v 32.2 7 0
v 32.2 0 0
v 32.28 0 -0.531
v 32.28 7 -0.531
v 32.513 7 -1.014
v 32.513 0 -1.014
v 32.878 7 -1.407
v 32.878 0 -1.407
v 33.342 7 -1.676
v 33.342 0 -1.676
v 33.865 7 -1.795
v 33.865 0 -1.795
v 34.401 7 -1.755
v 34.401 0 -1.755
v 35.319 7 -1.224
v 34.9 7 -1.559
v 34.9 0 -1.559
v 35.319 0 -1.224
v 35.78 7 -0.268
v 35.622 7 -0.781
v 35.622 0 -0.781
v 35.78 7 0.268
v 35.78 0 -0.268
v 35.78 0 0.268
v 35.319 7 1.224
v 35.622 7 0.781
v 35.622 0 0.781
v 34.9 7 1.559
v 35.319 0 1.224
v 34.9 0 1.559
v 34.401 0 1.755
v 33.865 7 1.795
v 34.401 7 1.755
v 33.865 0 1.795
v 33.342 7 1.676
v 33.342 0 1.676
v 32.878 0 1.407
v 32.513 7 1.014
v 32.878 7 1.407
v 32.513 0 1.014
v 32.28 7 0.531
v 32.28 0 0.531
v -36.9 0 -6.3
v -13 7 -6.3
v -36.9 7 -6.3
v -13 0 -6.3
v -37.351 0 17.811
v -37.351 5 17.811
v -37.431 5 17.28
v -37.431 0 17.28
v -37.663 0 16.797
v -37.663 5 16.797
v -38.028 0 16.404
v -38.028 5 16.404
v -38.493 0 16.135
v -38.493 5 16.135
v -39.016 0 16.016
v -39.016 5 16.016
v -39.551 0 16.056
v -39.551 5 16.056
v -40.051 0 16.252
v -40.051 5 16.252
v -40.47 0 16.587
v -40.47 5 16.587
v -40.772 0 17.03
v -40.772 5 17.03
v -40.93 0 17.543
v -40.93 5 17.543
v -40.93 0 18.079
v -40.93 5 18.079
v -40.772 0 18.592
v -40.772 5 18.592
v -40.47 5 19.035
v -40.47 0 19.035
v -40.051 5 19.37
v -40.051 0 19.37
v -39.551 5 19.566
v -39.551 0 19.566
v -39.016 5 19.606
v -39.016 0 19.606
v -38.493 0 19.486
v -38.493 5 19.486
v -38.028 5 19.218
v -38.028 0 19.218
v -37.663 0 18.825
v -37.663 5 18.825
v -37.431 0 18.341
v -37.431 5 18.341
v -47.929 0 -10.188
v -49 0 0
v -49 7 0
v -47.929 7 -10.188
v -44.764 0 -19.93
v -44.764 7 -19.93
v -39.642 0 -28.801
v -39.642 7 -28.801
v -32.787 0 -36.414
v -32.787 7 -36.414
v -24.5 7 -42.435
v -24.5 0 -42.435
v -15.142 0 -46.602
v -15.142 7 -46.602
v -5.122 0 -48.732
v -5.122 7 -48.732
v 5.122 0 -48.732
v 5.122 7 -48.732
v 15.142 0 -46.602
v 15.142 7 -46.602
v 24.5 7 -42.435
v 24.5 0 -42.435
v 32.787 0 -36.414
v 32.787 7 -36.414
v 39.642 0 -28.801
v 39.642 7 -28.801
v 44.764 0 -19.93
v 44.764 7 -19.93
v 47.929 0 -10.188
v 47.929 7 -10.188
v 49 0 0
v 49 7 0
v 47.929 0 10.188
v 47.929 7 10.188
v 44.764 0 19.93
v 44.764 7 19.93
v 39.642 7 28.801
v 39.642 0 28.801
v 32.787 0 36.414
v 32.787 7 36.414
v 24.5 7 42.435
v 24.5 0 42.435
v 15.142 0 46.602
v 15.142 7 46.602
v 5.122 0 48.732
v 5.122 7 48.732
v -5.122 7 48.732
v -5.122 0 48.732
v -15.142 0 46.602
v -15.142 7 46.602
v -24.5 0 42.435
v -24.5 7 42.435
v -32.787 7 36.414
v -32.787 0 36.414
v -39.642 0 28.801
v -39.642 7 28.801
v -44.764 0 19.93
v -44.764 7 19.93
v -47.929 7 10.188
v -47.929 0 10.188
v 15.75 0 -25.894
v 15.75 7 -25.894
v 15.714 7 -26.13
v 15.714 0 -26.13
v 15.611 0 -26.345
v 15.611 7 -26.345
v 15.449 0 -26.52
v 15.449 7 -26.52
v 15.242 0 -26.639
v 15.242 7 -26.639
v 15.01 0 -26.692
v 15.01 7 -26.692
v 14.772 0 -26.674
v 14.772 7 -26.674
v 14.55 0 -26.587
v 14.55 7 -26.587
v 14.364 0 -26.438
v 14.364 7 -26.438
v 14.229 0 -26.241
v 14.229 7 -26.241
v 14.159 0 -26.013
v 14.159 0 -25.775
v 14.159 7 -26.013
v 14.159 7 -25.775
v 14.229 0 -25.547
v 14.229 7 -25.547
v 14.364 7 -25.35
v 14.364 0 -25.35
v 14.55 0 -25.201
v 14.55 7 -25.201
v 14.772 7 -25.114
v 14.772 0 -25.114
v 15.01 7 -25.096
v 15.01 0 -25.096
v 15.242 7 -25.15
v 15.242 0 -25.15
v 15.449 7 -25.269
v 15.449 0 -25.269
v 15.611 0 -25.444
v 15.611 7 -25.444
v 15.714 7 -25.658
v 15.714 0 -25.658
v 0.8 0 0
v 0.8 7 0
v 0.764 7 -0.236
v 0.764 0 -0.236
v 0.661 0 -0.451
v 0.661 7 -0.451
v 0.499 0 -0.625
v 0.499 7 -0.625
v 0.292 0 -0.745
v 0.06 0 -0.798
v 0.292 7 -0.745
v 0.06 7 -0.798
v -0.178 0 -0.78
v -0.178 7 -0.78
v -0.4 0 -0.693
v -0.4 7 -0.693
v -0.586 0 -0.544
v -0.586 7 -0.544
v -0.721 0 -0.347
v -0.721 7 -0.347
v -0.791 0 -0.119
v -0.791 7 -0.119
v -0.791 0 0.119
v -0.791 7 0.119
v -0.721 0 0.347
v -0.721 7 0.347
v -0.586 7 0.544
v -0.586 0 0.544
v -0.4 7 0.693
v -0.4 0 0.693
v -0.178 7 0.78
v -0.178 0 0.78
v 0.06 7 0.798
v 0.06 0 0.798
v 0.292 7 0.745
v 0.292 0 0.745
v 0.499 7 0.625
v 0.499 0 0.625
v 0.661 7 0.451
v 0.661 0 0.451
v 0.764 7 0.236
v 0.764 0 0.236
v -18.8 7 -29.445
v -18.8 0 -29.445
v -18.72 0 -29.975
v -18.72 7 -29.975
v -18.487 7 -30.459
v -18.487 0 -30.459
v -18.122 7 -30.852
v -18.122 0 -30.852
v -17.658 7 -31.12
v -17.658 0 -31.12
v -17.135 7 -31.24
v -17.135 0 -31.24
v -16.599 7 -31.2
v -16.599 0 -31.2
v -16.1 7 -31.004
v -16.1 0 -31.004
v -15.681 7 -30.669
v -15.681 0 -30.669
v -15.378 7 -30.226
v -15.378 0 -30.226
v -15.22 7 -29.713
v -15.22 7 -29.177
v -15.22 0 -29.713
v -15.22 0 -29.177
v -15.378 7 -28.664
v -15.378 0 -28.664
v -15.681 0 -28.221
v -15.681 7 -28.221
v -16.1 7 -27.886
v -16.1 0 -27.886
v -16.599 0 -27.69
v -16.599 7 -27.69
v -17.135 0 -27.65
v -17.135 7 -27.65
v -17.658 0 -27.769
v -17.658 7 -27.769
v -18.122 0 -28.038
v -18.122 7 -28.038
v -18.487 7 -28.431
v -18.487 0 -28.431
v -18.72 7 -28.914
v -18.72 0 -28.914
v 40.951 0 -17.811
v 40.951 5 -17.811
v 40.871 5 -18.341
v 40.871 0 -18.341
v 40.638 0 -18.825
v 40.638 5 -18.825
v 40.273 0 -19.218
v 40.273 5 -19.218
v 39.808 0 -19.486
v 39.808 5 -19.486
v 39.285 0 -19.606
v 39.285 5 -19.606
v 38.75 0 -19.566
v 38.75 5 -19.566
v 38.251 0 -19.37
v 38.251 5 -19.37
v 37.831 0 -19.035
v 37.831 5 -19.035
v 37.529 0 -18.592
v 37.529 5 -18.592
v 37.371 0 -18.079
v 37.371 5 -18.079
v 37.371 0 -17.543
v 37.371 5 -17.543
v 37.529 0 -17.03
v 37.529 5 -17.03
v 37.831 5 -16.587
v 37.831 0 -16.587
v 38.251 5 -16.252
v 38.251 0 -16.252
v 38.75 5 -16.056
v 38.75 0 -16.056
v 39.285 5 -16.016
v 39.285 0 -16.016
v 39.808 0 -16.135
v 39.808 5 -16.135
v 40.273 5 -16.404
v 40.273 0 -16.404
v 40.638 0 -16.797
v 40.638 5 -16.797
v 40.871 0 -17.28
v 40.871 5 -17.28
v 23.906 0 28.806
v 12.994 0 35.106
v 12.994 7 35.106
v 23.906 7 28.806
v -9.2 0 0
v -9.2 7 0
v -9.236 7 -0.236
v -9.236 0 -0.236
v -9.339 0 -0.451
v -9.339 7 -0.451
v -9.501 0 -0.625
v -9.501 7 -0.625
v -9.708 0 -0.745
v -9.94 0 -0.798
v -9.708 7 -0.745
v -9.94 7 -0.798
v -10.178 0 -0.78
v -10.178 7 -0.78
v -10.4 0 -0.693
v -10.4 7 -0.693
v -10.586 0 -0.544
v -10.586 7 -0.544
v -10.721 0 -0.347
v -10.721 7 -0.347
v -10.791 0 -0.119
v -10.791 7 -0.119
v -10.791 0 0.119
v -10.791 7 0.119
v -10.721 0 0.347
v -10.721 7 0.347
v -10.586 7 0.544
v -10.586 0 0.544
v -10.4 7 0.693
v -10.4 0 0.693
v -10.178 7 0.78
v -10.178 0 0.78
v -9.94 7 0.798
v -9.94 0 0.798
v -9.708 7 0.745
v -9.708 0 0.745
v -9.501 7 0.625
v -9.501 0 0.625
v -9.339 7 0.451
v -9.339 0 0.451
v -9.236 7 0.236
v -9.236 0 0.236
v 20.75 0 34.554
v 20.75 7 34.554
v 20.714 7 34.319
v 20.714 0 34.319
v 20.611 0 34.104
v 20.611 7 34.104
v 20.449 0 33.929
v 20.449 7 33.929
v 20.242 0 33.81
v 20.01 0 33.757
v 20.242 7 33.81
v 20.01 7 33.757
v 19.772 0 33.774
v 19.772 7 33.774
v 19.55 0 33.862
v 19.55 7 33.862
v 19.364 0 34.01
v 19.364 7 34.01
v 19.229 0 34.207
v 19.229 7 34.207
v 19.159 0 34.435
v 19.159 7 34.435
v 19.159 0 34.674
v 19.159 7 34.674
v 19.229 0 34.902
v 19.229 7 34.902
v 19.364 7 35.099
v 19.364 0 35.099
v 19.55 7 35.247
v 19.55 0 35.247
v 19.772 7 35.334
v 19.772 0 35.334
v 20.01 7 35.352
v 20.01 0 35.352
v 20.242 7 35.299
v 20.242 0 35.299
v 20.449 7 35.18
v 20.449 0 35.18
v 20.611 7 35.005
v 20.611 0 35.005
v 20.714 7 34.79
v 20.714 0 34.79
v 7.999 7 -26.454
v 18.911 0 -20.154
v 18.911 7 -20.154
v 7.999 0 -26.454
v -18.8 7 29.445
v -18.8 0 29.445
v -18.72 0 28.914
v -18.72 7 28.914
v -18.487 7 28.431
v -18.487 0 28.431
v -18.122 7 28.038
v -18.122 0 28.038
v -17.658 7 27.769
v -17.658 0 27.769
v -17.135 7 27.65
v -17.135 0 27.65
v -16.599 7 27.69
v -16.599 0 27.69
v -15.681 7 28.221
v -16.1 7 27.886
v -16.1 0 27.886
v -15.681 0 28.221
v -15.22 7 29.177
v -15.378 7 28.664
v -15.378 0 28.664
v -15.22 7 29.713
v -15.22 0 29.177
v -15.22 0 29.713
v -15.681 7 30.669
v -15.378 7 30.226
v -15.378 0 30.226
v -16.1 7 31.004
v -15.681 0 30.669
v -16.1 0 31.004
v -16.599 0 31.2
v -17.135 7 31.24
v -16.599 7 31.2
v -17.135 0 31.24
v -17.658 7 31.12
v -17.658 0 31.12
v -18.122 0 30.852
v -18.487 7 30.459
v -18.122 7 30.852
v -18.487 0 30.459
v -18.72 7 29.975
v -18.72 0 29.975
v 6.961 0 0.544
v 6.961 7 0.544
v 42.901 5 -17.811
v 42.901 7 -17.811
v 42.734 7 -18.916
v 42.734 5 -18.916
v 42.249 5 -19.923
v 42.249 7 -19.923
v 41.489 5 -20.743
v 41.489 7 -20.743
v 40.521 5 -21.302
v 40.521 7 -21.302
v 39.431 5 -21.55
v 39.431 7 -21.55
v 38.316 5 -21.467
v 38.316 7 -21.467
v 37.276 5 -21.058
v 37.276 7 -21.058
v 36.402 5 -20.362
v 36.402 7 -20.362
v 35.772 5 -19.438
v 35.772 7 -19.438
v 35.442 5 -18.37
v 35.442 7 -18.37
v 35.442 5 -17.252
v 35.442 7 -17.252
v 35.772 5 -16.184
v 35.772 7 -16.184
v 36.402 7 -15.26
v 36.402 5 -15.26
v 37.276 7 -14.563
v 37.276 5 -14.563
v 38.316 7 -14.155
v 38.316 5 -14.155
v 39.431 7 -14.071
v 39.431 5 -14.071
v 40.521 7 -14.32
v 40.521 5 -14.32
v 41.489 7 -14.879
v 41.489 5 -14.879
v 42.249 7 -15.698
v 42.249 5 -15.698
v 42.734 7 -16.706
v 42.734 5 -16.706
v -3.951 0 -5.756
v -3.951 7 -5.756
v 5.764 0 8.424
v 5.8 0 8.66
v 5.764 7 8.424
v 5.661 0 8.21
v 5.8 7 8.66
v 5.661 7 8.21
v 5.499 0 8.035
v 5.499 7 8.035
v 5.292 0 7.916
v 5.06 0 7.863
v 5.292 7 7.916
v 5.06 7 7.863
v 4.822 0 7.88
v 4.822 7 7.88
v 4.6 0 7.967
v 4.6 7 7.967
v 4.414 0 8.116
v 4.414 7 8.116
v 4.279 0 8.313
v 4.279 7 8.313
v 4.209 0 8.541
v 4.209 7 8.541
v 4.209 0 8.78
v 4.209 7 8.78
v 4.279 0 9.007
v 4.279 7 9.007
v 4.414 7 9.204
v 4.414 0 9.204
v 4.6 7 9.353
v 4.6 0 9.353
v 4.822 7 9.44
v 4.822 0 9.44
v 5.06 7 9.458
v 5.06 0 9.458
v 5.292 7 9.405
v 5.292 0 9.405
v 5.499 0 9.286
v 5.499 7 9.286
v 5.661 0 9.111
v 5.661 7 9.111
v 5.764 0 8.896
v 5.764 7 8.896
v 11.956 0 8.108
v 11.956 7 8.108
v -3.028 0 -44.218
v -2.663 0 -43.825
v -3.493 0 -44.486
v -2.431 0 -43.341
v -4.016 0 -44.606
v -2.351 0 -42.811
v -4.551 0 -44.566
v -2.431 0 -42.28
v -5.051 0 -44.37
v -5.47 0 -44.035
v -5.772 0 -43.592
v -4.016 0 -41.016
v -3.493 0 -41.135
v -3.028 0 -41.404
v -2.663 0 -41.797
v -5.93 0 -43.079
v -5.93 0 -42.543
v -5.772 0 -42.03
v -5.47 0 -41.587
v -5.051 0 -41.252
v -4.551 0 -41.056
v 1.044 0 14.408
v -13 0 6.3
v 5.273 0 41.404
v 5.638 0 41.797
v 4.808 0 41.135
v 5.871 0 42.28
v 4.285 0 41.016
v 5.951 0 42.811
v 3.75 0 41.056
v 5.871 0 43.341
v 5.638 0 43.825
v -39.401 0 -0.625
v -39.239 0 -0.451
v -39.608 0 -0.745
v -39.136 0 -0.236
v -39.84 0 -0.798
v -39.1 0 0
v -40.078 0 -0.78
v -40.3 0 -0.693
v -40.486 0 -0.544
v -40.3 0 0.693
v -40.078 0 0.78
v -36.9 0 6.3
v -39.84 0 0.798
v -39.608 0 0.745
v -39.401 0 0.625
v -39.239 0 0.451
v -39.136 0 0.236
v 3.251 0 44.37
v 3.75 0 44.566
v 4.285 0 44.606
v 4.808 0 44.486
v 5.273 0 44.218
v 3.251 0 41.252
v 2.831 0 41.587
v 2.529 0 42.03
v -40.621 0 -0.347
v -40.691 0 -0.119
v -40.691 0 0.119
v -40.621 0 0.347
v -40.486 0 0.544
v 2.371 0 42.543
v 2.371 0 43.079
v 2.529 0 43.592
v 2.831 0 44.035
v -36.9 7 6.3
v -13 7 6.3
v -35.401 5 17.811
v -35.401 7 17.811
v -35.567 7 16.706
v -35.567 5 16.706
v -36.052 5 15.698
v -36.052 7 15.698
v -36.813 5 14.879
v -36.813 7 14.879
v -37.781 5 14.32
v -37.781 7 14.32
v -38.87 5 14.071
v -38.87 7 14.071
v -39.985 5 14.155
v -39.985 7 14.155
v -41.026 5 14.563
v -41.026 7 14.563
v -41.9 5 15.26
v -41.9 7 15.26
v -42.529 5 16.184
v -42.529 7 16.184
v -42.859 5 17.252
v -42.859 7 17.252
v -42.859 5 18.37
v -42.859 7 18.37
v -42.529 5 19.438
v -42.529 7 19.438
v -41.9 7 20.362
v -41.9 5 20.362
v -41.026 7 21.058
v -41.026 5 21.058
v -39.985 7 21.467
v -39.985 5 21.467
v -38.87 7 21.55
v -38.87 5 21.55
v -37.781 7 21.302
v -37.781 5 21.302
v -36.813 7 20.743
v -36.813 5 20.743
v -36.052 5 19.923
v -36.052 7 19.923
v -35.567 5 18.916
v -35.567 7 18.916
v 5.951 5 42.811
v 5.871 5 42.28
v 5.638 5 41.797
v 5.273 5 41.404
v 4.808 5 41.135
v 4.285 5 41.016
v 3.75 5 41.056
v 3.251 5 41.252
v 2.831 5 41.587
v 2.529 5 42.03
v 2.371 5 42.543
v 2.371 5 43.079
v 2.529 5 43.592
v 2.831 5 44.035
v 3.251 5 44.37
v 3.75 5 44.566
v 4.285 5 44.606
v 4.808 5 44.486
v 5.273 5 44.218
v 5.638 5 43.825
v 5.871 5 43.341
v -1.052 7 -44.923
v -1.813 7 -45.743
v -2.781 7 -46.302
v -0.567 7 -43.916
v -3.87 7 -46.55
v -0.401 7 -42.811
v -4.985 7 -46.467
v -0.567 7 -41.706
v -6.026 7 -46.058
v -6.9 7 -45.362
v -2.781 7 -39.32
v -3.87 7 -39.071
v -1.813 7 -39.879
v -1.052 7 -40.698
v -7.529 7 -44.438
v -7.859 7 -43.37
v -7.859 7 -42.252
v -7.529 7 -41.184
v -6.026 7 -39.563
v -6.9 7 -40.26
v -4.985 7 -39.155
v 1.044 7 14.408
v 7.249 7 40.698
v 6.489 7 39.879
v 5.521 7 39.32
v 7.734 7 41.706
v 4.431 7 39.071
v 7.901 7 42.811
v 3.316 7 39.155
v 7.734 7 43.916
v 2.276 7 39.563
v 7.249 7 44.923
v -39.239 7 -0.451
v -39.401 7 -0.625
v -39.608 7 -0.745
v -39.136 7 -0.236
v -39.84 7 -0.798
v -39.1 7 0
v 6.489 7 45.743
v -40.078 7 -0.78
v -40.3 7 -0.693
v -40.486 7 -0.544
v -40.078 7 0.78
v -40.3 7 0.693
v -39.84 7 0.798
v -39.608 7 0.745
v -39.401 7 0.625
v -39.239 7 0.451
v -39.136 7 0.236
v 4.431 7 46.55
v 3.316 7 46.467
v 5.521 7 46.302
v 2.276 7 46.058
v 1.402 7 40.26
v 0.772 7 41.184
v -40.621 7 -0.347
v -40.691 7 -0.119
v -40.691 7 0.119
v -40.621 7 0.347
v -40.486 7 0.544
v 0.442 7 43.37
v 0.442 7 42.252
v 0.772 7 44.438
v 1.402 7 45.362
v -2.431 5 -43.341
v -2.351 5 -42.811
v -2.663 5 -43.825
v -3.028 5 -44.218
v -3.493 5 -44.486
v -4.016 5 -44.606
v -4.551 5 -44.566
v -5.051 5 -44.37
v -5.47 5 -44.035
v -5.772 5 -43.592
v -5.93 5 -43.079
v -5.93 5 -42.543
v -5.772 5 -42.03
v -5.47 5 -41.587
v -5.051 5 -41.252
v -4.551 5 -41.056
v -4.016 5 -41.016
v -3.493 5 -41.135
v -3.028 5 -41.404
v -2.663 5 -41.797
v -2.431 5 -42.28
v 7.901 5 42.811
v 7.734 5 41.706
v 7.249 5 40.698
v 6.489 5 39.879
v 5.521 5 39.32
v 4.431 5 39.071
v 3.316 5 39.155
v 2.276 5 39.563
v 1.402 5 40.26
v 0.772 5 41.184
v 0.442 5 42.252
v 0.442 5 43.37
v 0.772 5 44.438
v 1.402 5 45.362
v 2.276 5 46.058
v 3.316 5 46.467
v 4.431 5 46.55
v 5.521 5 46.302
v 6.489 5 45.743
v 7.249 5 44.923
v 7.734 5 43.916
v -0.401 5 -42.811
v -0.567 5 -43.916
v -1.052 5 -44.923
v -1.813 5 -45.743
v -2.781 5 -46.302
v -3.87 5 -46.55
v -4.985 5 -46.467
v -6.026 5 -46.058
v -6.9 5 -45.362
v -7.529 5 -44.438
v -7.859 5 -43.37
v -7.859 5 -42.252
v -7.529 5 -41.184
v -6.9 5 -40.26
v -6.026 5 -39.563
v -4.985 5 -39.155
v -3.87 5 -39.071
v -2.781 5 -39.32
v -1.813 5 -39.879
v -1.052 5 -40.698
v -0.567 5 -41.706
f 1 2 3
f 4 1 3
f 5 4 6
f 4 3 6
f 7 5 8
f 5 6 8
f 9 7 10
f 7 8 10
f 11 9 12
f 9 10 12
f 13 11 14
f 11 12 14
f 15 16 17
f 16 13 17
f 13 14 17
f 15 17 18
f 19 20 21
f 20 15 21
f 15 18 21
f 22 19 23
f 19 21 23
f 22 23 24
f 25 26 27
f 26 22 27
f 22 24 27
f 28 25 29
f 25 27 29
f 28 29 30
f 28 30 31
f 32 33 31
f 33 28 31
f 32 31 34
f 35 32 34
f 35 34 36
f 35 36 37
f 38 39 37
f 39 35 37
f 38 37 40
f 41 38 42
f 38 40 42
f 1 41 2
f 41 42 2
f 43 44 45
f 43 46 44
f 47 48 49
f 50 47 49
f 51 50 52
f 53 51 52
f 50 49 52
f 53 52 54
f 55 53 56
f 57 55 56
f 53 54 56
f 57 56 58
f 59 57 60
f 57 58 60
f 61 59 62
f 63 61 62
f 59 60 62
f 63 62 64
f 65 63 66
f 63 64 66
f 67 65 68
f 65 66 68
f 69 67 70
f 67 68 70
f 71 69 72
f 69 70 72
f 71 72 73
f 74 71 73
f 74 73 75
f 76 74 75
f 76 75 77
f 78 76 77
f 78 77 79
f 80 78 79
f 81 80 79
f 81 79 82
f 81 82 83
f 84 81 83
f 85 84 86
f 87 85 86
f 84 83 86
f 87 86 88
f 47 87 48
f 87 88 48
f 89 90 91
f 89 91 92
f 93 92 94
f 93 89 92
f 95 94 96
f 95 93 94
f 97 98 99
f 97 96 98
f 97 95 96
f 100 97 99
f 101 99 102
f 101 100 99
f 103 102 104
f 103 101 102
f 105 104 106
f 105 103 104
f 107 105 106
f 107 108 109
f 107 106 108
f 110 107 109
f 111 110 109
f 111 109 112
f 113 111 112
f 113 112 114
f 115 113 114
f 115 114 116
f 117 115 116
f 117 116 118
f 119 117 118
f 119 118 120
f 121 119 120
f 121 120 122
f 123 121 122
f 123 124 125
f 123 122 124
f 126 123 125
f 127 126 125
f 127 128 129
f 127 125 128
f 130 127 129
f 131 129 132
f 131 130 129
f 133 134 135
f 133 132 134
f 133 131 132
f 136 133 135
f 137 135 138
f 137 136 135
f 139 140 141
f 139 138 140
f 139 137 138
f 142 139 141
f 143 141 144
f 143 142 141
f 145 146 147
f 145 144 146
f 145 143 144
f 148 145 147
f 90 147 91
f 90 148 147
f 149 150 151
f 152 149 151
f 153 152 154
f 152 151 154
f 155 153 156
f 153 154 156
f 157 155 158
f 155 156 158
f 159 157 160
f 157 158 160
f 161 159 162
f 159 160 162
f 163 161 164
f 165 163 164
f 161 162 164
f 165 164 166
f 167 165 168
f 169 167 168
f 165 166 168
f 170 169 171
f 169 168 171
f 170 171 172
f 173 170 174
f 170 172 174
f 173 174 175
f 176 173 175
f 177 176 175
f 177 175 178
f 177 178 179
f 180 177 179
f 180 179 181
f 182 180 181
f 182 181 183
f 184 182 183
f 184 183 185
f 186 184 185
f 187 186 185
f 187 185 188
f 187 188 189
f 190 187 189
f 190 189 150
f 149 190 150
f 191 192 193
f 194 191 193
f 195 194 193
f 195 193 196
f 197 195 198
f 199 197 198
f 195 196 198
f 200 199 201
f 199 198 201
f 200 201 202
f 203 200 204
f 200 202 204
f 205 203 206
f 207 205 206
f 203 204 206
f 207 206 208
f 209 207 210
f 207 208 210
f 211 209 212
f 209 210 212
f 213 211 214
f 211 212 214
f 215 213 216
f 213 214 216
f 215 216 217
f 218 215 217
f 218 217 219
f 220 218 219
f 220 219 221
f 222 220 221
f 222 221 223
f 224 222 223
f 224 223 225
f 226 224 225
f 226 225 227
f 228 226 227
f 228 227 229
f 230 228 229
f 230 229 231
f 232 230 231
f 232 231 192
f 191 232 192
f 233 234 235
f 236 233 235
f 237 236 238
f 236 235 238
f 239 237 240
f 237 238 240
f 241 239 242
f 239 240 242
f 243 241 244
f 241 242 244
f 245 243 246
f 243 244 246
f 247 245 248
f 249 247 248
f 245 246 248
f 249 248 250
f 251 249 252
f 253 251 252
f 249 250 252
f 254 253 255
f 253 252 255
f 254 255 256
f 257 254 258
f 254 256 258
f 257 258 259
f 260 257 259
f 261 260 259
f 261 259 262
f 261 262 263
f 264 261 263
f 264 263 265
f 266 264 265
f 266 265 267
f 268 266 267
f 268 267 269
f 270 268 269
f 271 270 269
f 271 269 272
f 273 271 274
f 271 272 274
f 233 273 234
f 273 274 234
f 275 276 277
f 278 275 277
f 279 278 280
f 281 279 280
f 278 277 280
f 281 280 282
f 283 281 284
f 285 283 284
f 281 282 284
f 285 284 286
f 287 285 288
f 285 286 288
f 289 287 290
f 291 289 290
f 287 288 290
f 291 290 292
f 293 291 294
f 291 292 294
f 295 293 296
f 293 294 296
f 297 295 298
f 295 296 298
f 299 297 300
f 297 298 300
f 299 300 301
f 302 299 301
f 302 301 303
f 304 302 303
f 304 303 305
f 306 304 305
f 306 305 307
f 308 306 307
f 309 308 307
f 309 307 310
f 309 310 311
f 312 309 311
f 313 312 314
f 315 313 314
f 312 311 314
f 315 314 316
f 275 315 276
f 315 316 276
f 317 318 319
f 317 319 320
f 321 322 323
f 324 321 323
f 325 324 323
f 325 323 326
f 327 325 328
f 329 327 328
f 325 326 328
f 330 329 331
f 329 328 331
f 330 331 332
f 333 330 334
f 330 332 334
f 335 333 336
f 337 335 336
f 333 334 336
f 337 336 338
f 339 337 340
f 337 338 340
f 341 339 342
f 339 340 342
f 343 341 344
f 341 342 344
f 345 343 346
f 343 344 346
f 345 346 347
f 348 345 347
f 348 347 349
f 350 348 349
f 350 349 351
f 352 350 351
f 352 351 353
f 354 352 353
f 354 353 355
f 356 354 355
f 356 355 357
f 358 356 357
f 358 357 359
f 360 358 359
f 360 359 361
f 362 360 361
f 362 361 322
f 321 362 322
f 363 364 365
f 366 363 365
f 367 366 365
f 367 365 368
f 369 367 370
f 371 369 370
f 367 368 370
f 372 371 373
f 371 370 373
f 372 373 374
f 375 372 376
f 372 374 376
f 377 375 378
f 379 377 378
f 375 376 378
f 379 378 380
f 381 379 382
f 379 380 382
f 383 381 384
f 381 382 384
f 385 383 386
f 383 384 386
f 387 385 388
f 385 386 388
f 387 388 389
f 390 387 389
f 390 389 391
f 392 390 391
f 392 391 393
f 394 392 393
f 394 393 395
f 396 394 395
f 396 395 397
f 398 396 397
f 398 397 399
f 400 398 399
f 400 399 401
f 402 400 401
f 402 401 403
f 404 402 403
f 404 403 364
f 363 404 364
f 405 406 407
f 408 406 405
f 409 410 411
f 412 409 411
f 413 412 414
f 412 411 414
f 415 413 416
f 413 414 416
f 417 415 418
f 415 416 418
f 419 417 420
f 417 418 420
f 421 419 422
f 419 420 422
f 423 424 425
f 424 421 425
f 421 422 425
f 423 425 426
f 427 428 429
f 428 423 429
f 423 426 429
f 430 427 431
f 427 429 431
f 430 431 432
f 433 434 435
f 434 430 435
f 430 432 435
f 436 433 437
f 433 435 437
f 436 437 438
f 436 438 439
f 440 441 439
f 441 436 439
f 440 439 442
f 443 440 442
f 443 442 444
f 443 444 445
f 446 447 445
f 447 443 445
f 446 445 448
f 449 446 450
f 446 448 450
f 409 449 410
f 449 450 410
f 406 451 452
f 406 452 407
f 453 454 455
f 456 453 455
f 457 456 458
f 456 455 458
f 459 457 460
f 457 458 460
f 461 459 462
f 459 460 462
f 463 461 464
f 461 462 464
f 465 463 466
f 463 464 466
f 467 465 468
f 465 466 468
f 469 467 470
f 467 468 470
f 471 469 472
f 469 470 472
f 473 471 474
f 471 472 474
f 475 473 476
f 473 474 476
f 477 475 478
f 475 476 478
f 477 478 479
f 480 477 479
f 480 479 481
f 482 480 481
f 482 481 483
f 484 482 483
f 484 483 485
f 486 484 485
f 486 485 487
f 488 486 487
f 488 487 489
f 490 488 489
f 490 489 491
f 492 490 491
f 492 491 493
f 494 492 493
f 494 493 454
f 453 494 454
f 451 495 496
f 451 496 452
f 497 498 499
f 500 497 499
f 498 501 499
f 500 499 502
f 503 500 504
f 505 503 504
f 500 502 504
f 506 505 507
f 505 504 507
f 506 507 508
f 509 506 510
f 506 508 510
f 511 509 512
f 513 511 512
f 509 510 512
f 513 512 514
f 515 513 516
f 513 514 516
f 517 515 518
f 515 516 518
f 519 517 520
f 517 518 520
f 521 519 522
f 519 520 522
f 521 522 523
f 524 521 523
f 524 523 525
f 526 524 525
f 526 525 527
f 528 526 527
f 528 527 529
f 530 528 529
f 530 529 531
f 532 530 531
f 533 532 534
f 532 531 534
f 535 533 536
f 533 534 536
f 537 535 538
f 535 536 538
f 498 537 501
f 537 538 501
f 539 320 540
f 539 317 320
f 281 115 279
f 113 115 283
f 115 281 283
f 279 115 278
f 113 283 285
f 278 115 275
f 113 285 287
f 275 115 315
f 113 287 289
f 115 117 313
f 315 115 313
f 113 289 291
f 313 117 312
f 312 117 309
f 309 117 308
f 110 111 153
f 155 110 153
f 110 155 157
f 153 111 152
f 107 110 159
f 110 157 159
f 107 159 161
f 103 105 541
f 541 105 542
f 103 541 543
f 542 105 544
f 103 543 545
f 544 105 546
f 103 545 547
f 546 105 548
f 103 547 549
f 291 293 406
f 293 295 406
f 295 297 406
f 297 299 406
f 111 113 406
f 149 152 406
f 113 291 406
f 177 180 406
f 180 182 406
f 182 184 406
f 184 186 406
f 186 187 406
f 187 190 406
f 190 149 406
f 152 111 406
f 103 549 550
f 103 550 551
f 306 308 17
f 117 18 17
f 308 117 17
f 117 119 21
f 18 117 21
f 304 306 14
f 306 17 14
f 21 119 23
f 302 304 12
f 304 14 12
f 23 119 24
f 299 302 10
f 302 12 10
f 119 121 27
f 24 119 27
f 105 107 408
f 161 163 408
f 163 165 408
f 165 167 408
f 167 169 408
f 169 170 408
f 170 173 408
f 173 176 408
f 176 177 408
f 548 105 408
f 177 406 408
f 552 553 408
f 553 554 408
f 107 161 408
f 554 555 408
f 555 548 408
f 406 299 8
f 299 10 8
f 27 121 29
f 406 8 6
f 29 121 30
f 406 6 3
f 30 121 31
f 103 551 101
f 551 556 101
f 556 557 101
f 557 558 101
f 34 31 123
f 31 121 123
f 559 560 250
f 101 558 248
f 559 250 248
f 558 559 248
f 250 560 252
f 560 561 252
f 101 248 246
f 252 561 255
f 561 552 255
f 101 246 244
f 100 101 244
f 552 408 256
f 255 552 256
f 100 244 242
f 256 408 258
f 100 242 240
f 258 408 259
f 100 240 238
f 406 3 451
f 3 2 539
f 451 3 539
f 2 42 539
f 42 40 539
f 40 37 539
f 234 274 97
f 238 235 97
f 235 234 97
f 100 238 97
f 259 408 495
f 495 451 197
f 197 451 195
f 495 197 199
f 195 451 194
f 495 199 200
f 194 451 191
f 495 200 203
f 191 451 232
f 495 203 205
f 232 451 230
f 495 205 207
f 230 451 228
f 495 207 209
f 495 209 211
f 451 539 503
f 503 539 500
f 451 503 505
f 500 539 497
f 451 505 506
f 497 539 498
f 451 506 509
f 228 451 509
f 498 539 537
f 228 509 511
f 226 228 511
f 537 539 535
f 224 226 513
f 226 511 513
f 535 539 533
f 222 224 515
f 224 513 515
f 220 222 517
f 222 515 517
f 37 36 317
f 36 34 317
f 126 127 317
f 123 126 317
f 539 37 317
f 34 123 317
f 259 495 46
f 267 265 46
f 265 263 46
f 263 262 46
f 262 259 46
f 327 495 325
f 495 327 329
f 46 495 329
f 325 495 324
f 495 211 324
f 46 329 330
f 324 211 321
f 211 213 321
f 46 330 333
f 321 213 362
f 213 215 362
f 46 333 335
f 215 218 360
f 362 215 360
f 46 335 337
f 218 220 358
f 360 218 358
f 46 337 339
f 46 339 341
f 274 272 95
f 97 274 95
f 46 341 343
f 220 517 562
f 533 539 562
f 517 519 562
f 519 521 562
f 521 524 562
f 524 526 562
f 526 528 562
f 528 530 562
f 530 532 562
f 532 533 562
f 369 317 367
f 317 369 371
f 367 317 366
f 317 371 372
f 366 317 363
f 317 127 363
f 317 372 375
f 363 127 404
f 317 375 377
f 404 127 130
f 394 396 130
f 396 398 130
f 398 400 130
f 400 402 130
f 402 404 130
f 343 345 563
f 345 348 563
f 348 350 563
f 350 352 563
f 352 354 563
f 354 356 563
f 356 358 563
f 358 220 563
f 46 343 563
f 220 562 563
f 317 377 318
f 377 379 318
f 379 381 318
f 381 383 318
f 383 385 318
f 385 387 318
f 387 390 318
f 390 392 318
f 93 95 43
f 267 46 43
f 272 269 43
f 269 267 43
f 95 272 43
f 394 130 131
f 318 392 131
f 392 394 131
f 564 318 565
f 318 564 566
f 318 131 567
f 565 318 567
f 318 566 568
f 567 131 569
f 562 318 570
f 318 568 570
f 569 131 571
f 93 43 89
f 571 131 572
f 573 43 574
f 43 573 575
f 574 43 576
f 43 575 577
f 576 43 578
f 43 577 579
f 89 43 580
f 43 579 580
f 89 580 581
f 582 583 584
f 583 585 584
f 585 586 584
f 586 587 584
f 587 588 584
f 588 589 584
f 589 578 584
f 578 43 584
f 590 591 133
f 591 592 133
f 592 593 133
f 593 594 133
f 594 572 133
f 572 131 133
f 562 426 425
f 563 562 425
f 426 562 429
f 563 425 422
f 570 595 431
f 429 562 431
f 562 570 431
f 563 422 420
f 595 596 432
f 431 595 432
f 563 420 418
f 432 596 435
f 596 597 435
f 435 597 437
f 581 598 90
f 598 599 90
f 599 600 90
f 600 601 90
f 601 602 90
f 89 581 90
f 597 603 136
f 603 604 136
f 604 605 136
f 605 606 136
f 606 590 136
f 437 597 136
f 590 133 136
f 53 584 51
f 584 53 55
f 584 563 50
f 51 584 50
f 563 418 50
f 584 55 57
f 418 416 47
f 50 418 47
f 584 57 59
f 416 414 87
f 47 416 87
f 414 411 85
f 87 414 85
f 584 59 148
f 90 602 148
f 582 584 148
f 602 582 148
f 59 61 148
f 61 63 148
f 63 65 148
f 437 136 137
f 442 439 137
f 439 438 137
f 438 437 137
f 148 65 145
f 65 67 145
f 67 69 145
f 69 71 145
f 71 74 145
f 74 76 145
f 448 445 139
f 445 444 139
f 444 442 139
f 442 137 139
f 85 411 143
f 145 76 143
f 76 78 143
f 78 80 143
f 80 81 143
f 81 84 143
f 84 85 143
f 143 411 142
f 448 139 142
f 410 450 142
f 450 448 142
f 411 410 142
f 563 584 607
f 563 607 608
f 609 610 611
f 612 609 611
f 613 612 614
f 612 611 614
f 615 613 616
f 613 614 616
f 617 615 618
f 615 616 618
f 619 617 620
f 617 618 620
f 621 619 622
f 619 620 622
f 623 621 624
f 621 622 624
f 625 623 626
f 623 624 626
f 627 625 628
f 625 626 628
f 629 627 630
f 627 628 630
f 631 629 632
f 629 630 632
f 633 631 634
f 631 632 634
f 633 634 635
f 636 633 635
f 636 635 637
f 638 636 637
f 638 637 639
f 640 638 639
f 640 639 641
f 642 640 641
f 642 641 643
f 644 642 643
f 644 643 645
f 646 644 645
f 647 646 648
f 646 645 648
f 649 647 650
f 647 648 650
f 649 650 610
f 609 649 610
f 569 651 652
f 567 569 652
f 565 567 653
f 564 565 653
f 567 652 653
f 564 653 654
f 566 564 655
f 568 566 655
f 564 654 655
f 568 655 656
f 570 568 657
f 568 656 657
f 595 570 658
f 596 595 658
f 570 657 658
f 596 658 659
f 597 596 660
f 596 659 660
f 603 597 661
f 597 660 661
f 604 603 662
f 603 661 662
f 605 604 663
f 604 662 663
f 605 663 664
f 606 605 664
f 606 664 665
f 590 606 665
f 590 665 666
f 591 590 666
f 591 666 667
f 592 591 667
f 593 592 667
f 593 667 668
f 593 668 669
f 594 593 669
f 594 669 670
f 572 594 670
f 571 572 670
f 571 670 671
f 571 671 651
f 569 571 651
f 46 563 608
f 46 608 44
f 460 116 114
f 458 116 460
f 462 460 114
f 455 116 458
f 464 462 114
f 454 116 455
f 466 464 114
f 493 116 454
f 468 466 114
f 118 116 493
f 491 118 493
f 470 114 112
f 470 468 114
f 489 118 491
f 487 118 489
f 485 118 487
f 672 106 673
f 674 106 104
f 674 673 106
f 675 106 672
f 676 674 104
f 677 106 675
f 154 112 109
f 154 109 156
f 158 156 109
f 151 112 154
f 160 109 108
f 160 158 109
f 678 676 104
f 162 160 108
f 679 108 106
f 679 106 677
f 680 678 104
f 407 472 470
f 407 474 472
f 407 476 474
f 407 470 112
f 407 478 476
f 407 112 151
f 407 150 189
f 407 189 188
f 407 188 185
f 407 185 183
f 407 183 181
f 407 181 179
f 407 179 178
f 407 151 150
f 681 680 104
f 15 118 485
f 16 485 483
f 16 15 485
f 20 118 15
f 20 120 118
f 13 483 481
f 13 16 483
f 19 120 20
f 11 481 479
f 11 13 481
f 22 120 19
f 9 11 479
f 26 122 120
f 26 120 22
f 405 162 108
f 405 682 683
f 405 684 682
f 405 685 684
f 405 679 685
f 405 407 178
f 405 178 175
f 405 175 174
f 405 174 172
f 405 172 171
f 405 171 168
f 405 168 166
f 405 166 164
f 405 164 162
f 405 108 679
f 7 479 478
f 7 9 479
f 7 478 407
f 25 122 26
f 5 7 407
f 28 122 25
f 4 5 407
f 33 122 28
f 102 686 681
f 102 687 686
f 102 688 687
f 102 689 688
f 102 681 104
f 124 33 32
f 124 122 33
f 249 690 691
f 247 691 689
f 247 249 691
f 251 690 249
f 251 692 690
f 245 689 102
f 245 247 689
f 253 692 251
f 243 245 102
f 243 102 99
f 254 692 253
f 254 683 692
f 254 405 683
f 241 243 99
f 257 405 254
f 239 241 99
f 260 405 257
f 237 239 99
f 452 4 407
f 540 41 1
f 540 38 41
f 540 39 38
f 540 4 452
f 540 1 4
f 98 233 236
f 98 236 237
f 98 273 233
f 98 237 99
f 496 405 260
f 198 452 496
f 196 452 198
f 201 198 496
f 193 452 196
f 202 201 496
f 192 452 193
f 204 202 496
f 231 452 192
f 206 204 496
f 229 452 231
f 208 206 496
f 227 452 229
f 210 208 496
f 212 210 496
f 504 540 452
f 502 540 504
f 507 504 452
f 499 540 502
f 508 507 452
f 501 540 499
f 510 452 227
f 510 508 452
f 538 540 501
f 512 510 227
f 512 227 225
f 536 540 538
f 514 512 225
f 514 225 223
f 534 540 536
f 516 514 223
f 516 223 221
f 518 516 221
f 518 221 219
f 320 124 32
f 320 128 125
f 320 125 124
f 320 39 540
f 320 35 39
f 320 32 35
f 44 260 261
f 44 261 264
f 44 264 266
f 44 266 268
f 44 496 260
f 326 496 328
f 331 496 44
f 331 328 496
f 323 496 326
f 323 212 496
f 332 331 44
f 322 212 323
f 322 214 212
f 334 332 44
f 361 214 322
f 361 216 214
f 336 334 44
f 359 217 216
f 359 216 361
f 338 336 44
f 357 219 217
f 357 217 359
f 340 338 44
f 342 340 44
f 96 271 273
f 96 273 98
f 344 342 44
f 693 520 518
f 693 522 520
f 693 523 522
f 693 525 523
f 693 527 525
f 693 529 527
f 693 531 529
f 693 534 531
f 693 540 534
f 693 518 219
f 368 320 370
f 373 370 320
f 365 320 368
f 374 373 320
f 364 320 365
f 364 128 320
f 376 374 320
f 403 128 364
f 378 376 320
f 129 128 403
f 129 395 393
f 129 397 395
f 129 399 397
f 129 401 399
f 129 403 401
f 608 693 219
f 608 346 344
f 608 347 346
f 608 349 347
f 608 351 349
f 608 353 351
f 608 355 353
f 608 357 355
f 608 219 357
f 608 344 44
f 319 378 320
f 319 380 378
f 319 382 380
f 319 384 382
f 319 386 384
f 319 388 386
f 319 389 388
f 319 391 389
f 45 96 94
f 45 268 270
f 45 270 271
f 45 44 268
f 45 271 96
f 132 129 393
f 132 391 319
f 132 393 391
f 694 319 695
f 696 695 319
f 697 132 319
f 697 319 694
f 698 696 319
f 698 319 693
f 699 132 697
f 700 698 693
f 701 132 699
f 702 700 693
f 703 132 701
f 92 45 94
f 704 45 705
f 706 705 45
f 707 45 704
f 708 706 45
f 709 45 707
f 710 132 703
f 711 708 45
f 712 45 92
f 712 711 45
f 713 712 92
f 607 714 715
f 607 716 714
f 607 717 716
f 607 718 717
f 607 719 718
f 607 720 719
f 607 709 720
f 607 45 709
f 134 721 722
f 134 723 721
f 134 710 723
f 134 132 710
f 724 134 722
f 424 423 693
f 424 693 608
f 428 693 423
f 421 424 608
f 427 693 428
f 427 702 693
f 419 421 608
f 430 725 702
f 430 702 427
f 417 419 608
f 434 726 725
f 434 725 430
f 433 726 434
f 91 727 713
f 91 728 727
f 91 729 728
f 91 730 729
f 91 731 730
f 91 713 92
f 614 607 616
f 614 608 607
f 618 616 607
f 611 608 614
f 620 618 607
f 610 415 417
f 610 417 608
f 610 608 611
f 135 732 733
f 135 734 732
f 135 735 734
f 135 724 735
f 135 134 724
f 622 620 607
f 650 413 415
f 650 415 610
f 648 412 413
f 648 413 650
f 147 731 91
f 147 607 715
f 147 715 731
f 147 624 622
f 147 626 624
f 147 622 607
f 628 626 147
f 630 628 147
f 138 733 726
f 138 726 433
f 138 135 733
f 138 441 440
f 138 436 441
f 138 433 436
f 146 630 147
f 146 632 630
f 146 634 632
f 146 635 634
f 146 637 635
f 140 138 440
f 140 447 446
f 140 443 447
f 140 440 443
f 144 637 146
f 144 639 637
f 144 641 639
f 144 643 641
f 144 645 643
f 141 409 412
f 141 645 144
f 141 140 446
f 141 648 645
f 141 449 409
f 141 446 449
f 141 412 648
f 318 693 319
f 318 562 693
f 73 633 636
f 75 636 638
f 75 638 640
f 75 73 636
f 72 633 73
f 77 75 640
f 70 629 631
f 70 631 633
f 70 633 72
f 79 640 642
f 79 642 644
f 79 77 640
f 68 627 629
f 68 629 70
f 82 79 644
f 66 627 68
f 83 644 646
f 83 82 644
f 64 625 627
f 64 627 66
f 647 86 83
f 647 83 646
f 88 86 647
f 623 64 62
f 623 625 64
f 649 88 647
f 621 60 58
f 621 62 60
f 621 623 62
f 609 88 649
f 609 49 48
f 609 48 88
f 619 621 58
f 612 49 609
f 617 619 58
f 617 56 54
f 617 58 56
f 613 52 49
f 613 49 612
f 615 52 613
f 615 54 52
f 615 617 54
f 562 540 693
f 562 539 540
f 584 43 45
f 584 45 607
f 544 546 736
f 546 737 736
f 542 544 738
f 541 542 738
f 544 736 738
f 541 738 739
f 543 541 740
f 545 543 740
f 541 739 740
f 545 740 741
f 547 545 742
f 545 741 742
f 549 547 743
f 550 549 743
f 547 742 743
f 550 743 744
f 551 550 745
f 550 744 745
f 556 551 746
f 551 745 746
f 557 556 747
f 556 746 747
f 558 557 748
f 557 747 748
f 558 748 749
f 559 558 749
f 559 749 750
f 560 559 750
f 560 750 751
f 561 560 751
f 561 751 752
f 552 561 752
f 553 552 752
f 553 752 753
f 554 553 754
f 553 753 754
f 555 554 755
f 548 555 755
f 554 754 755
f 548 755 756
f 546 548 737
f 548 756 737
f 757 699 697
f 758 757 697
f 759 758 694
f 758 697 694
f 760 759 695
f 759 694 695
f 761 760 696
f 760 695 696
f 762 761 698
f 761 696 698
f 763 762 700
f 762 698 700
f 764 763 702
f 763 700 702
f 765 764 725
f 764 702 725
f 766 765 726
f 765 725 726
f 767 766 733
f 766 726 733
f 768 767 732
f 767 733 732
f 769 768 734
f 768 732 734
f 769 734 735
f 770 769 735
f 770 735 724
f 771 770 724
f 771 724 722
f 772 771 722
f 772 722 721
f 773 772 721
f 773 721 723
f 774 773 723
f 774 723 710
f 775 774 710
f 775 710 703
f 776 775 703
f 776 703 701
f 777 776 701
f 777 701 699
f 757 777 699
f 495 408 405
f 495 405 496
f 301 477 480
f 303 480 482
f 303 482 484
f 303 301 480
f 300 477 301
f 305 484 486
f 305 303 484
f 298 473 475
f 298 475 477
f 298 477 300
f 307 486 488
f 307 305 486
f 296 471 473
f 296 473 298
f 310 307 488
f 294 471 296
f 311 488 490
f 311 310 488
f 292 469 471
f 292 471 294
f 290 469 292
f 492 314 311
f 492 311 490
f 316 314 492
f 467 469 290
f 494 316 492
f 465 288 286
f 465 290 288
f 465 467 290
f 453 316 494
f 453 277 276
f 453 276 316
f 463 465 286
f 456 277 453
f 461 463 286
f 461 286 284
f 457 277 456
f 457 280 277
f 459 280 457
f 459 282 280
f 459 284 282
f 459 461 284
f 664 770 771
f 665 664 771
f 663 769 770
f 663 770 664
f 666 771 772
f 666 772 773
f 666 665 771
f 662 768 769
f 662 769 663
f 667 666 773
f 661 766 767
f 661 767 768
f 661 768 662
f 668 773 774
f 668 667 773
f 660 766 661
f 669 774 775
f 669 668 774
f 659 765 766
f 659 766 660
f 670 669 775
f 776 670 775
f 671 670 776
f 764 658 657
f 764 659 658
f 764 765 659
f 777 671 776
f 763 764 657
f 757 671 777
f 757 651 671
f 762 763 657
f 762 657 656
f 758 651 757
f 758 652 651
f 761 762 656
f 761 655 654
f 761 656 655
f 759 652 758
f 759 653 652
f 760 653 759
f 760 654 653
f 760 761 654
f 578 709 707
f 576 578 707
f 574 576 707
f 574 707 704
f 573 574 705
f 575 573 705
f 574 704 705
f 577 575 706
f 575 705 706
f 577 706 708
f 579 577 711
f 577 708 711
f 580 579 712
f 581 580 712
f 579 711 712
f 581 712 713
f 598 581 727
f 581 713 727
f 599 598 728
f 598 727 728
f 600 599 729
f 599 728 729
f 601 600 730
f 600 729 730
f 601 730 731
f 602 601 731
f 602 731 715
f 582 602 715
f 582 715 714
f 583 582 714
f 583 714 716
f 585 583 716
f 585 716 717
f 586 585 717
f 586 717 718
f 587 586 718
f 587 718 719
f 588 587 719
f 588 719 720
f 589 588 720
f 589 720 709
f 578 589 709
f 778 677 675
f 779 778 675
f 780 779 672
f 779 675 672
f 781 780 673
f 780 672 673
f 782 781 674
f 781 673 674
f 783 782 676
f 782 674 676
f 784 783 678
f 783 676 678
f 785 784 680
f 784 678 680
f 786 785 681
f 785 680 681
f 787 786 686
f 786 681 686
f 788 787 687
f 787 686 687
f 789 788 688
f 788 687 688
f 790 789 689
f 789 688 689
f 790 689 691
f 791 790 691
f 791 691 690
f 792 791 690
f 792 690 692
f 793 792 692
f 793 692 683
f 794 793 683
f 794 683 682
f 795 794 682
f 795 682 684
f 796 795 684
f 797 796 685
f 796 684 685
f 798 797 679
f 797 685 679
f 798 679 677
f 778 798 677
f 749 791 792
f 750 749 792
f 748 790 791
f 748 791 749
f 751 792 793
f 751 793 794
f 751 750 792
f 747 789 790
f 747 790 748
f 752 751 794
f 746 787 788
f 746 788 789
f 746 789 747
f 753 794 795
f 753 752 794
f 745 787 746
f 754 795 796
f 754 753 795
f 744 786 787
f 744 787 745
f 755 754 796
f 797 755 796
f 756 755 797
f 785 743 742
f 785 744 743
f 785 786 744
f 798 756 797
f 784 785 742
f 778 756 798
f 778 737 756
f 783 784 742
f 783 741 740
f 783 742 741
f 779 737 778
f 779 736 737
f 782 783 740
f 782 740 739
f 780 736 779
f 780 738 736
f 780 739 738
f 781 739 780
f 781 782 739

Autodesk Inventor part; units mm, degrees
ref_plane "YZ Plane" through (0, 0, 0) normal (1, 0, 0) x (0, 1, 0)
ref_plane "XZ Plane" through (0, 0, 0) normal (0, 1, 0) x (-1, 0, 0)
ref_plane "XY Plane" through (0, 0, 0) normal (0, 0, 1) x (1, 0, 0)
sketch "Sketch1" plane through (0, 0, 0) normal (0, 1, 0) x (-1, 0, 0)
  circle A0 centre (0, 0) radius 45 construction
  line L0 (36.9, 6.3) -> (13, 6.3)
  line L1 (13, 6.3) -> (13, -6.3)
  line L2 (13, -6.3) -> (36.9, -6.3)
  line L3 (36.9, -6.3) -> (36.9, 6.3)
  line L4 (-12.994, 35.1063) -> (-23.906, 28.8063)
  line L5 (-23.906, 28.8063) -> (-11.956, 8.1083)
  line L6 (-1.044, 14.4083) -> (-12.994, 35.1063)
  line L7 (-11.956, 8.1083) -> (-1.044, 14.4083)
  line L8 (-18.9106, -20.1539) -> (-7.9987, -26.4539)
  line L9 (-7.9987, -26.4539) -> (3.9513, -5.7559)
  line L10 (-6.9606, 0.5441) -> (-18.9106, -20.1539)
  line L11 (3.9513, -5.7559) -> (-6.9606, 0.5441)
  circle A1 centre (11.0177, 0) radius 18 construction
  circle A2 centre (-5.5088, 9.5416) radius 18 construction
  circle A3 centre (-5.5088, -9.5416) radius 18 construction
  circle A4 centre (17, -29.4449) radius 1.8
  line L12 (0, 0) -> (20.2687, -35.1063)
  circle A5 centre (17, 29.4449) radius 1.8
  circle A6 centre (-34, 0) radius 1.8
  circle A7 centre (0, 0) radius 49
  line L13 (-5.5088, -9.5416) -> (-0.5088, -0.8813) construction
  line L14 (-5.5088, -9.5416) -> (4.4912, -9.5416) construction
  line L15 (-18.45, -31.9563) -> (3.4912, 6.0469) construction
  line L16 (-17.931, -18.4573) -> (-7.019, -24.7573) construction
  point P0 (-12.475, -21.6073)
  point P1 (-7.4794, -12.9547)
  dimension "d0" = 90
  dimension "d1" = 12.6
  dimension "d2" = 23.9
  dimension "d3" = 13
  dimension "d4" = 38.7
  dimension "d7" = 360
  dimension "d9" = 36
  dimension "d12" = 360
  dimension "d14" = 3.6
  dimension "d15" = 34
  dimension "d16" = -0.544
  dimension "d19" = 360
  dimension "d21" = 98
  dimension "d38" = 10
  dimension "d39" = 60
  dimension "d40" = 14.9588
extrude "Extrusion1" add sketch "Sketch1" along normal blind 7
sketch "Sketch2" plane through (0, 7, 0) normal (0, 1, 0) x (1, 0, 0)
  circle A0 centre (0, 0) radius 39.9 construction
  line L0 (1.044, -14.4083) -> (11.956, -8.1083) construction
  line L1 (6.5, -11.2583) -> (23.7787, -41.1859) construction
  circle A1 centre (19.95, -34.5544) radius 0.8
  circle A2 centre (14.95, 25.8942) radius 0.8
  circle A3 centre (-39.9, 0) radius 0.8
  line L2 (12.994, -35.1063) -> (1.044, -14.4083) construction
  line L3 (7.019, -24.7573) -> (17.931, -18.4573) construction
  line L4 (11.956, -8.1083) -> (23.906, -28.8063) construction
  circle A4 centre (5, -8.6603) radius 0.8
  circle A5 centre (0, 0) radius 0.8
  circle A6 centre (-10, 0) radius 0.8
  line L5 (0, 0) -> (22.1905, 38.4351) construction
  line L6 (0, 0) -> (44.3811, 0) construction
  line L7 (15.8257, 27.411) -> (10.8257, 18.7507)
  dimension "d24" = 79.8
  dimension "d25" = 1.6
  dimension "d28" = 360
  dimension "d34" = 360
  dimension "d41" = 60
  dimension "d42" = 10
extrude "Extrusion2" cut sketch "Sketch2" against normal through all
sketch "Sketch6" plane through (0, 7, 0) normal (0, 1, 0) x (1, 0, 0)
  line L0 (39.1506, 17.8109) -> (-4.1506, 42.8109)
  line L1 (-4.1506, 42.8109) -> (-39.1506, -17.8109)
  line L2 (-39.1506, -17.8109) -> (4.1506, -42.8109)
  line L3 (4.1506, -42.8109) -> (39.1506, 17.8109)
  line L4 (21.6506, -12.5) -> (-21.6506, 12.5) construction
  circle A0 centre (0, 0) radius 0.8 construction
  line L5 (0, 0) -> (-28.8675, 0) construction
  circle A1 centre (-39.1506, -17.8109) radius 1.8
  circle A2 centre (4.1506, -42.8109) radius 1.8
  circle A3 centre (-4.1506, 42.8109) radius 1.8
  circle A4 centre (39.1506, 17.8109) radius 1.8
  point P0 (0, 0)
  dimension "d43" = 25
  dimension "d44" = 25
  dimension "d45" = 35
  dimension "d46" = 35
  dimension "d47" = 30
  dimension "d48" = 3.6
  dimension "d49" = 3.6
extrude "Extrusion3" cut sketch "Sketch6" against normal through all contours L3 A4 L0 | L0 A4 L3 | A3 L1 L0 | L0 L1 A3 | A2 L2 L3 | L3 L2 A2 | A1 L2 L1 | L1 L2 A1
sketch "Sketch7" plane through (0, 7, 0) normal (0, 1, 0) x (1, 0, 0)
  circle A0 centre (-4.1506, 42.8109) radius 1.8 projected
  circle A1 centre (-4.1506, 42.8109) radius 3.75
  circle A2 centre (39.1506, 17.8109) radius 1.8 projected
  circle A3 centre (39.1506, 17.8109) radius 3.75
  circle A4 centre (-39.1506, -17.8109) radius 1.8 projected
  circle A5 centre (-39.1506, -17.8109) radius 3.75
  circle A6 centre (4.1506, -42.8109) radius 1.8 projected
  circle A7 centre (4.1506, -42.8109) radius 3.75
  point P0 (0, 0)
  dimension "d52" = 7.5
  dimension "d53" = 7.5
  dimension "d54" = 7.5
  dimension "d55" = 7.5
extrude "Extrusion4" cut sketch "Sketch7" against normal blind 2 contours A0 | A1 | A2 | A3 | A5 | A6 | A7
properties part number "Servo Mounts"
